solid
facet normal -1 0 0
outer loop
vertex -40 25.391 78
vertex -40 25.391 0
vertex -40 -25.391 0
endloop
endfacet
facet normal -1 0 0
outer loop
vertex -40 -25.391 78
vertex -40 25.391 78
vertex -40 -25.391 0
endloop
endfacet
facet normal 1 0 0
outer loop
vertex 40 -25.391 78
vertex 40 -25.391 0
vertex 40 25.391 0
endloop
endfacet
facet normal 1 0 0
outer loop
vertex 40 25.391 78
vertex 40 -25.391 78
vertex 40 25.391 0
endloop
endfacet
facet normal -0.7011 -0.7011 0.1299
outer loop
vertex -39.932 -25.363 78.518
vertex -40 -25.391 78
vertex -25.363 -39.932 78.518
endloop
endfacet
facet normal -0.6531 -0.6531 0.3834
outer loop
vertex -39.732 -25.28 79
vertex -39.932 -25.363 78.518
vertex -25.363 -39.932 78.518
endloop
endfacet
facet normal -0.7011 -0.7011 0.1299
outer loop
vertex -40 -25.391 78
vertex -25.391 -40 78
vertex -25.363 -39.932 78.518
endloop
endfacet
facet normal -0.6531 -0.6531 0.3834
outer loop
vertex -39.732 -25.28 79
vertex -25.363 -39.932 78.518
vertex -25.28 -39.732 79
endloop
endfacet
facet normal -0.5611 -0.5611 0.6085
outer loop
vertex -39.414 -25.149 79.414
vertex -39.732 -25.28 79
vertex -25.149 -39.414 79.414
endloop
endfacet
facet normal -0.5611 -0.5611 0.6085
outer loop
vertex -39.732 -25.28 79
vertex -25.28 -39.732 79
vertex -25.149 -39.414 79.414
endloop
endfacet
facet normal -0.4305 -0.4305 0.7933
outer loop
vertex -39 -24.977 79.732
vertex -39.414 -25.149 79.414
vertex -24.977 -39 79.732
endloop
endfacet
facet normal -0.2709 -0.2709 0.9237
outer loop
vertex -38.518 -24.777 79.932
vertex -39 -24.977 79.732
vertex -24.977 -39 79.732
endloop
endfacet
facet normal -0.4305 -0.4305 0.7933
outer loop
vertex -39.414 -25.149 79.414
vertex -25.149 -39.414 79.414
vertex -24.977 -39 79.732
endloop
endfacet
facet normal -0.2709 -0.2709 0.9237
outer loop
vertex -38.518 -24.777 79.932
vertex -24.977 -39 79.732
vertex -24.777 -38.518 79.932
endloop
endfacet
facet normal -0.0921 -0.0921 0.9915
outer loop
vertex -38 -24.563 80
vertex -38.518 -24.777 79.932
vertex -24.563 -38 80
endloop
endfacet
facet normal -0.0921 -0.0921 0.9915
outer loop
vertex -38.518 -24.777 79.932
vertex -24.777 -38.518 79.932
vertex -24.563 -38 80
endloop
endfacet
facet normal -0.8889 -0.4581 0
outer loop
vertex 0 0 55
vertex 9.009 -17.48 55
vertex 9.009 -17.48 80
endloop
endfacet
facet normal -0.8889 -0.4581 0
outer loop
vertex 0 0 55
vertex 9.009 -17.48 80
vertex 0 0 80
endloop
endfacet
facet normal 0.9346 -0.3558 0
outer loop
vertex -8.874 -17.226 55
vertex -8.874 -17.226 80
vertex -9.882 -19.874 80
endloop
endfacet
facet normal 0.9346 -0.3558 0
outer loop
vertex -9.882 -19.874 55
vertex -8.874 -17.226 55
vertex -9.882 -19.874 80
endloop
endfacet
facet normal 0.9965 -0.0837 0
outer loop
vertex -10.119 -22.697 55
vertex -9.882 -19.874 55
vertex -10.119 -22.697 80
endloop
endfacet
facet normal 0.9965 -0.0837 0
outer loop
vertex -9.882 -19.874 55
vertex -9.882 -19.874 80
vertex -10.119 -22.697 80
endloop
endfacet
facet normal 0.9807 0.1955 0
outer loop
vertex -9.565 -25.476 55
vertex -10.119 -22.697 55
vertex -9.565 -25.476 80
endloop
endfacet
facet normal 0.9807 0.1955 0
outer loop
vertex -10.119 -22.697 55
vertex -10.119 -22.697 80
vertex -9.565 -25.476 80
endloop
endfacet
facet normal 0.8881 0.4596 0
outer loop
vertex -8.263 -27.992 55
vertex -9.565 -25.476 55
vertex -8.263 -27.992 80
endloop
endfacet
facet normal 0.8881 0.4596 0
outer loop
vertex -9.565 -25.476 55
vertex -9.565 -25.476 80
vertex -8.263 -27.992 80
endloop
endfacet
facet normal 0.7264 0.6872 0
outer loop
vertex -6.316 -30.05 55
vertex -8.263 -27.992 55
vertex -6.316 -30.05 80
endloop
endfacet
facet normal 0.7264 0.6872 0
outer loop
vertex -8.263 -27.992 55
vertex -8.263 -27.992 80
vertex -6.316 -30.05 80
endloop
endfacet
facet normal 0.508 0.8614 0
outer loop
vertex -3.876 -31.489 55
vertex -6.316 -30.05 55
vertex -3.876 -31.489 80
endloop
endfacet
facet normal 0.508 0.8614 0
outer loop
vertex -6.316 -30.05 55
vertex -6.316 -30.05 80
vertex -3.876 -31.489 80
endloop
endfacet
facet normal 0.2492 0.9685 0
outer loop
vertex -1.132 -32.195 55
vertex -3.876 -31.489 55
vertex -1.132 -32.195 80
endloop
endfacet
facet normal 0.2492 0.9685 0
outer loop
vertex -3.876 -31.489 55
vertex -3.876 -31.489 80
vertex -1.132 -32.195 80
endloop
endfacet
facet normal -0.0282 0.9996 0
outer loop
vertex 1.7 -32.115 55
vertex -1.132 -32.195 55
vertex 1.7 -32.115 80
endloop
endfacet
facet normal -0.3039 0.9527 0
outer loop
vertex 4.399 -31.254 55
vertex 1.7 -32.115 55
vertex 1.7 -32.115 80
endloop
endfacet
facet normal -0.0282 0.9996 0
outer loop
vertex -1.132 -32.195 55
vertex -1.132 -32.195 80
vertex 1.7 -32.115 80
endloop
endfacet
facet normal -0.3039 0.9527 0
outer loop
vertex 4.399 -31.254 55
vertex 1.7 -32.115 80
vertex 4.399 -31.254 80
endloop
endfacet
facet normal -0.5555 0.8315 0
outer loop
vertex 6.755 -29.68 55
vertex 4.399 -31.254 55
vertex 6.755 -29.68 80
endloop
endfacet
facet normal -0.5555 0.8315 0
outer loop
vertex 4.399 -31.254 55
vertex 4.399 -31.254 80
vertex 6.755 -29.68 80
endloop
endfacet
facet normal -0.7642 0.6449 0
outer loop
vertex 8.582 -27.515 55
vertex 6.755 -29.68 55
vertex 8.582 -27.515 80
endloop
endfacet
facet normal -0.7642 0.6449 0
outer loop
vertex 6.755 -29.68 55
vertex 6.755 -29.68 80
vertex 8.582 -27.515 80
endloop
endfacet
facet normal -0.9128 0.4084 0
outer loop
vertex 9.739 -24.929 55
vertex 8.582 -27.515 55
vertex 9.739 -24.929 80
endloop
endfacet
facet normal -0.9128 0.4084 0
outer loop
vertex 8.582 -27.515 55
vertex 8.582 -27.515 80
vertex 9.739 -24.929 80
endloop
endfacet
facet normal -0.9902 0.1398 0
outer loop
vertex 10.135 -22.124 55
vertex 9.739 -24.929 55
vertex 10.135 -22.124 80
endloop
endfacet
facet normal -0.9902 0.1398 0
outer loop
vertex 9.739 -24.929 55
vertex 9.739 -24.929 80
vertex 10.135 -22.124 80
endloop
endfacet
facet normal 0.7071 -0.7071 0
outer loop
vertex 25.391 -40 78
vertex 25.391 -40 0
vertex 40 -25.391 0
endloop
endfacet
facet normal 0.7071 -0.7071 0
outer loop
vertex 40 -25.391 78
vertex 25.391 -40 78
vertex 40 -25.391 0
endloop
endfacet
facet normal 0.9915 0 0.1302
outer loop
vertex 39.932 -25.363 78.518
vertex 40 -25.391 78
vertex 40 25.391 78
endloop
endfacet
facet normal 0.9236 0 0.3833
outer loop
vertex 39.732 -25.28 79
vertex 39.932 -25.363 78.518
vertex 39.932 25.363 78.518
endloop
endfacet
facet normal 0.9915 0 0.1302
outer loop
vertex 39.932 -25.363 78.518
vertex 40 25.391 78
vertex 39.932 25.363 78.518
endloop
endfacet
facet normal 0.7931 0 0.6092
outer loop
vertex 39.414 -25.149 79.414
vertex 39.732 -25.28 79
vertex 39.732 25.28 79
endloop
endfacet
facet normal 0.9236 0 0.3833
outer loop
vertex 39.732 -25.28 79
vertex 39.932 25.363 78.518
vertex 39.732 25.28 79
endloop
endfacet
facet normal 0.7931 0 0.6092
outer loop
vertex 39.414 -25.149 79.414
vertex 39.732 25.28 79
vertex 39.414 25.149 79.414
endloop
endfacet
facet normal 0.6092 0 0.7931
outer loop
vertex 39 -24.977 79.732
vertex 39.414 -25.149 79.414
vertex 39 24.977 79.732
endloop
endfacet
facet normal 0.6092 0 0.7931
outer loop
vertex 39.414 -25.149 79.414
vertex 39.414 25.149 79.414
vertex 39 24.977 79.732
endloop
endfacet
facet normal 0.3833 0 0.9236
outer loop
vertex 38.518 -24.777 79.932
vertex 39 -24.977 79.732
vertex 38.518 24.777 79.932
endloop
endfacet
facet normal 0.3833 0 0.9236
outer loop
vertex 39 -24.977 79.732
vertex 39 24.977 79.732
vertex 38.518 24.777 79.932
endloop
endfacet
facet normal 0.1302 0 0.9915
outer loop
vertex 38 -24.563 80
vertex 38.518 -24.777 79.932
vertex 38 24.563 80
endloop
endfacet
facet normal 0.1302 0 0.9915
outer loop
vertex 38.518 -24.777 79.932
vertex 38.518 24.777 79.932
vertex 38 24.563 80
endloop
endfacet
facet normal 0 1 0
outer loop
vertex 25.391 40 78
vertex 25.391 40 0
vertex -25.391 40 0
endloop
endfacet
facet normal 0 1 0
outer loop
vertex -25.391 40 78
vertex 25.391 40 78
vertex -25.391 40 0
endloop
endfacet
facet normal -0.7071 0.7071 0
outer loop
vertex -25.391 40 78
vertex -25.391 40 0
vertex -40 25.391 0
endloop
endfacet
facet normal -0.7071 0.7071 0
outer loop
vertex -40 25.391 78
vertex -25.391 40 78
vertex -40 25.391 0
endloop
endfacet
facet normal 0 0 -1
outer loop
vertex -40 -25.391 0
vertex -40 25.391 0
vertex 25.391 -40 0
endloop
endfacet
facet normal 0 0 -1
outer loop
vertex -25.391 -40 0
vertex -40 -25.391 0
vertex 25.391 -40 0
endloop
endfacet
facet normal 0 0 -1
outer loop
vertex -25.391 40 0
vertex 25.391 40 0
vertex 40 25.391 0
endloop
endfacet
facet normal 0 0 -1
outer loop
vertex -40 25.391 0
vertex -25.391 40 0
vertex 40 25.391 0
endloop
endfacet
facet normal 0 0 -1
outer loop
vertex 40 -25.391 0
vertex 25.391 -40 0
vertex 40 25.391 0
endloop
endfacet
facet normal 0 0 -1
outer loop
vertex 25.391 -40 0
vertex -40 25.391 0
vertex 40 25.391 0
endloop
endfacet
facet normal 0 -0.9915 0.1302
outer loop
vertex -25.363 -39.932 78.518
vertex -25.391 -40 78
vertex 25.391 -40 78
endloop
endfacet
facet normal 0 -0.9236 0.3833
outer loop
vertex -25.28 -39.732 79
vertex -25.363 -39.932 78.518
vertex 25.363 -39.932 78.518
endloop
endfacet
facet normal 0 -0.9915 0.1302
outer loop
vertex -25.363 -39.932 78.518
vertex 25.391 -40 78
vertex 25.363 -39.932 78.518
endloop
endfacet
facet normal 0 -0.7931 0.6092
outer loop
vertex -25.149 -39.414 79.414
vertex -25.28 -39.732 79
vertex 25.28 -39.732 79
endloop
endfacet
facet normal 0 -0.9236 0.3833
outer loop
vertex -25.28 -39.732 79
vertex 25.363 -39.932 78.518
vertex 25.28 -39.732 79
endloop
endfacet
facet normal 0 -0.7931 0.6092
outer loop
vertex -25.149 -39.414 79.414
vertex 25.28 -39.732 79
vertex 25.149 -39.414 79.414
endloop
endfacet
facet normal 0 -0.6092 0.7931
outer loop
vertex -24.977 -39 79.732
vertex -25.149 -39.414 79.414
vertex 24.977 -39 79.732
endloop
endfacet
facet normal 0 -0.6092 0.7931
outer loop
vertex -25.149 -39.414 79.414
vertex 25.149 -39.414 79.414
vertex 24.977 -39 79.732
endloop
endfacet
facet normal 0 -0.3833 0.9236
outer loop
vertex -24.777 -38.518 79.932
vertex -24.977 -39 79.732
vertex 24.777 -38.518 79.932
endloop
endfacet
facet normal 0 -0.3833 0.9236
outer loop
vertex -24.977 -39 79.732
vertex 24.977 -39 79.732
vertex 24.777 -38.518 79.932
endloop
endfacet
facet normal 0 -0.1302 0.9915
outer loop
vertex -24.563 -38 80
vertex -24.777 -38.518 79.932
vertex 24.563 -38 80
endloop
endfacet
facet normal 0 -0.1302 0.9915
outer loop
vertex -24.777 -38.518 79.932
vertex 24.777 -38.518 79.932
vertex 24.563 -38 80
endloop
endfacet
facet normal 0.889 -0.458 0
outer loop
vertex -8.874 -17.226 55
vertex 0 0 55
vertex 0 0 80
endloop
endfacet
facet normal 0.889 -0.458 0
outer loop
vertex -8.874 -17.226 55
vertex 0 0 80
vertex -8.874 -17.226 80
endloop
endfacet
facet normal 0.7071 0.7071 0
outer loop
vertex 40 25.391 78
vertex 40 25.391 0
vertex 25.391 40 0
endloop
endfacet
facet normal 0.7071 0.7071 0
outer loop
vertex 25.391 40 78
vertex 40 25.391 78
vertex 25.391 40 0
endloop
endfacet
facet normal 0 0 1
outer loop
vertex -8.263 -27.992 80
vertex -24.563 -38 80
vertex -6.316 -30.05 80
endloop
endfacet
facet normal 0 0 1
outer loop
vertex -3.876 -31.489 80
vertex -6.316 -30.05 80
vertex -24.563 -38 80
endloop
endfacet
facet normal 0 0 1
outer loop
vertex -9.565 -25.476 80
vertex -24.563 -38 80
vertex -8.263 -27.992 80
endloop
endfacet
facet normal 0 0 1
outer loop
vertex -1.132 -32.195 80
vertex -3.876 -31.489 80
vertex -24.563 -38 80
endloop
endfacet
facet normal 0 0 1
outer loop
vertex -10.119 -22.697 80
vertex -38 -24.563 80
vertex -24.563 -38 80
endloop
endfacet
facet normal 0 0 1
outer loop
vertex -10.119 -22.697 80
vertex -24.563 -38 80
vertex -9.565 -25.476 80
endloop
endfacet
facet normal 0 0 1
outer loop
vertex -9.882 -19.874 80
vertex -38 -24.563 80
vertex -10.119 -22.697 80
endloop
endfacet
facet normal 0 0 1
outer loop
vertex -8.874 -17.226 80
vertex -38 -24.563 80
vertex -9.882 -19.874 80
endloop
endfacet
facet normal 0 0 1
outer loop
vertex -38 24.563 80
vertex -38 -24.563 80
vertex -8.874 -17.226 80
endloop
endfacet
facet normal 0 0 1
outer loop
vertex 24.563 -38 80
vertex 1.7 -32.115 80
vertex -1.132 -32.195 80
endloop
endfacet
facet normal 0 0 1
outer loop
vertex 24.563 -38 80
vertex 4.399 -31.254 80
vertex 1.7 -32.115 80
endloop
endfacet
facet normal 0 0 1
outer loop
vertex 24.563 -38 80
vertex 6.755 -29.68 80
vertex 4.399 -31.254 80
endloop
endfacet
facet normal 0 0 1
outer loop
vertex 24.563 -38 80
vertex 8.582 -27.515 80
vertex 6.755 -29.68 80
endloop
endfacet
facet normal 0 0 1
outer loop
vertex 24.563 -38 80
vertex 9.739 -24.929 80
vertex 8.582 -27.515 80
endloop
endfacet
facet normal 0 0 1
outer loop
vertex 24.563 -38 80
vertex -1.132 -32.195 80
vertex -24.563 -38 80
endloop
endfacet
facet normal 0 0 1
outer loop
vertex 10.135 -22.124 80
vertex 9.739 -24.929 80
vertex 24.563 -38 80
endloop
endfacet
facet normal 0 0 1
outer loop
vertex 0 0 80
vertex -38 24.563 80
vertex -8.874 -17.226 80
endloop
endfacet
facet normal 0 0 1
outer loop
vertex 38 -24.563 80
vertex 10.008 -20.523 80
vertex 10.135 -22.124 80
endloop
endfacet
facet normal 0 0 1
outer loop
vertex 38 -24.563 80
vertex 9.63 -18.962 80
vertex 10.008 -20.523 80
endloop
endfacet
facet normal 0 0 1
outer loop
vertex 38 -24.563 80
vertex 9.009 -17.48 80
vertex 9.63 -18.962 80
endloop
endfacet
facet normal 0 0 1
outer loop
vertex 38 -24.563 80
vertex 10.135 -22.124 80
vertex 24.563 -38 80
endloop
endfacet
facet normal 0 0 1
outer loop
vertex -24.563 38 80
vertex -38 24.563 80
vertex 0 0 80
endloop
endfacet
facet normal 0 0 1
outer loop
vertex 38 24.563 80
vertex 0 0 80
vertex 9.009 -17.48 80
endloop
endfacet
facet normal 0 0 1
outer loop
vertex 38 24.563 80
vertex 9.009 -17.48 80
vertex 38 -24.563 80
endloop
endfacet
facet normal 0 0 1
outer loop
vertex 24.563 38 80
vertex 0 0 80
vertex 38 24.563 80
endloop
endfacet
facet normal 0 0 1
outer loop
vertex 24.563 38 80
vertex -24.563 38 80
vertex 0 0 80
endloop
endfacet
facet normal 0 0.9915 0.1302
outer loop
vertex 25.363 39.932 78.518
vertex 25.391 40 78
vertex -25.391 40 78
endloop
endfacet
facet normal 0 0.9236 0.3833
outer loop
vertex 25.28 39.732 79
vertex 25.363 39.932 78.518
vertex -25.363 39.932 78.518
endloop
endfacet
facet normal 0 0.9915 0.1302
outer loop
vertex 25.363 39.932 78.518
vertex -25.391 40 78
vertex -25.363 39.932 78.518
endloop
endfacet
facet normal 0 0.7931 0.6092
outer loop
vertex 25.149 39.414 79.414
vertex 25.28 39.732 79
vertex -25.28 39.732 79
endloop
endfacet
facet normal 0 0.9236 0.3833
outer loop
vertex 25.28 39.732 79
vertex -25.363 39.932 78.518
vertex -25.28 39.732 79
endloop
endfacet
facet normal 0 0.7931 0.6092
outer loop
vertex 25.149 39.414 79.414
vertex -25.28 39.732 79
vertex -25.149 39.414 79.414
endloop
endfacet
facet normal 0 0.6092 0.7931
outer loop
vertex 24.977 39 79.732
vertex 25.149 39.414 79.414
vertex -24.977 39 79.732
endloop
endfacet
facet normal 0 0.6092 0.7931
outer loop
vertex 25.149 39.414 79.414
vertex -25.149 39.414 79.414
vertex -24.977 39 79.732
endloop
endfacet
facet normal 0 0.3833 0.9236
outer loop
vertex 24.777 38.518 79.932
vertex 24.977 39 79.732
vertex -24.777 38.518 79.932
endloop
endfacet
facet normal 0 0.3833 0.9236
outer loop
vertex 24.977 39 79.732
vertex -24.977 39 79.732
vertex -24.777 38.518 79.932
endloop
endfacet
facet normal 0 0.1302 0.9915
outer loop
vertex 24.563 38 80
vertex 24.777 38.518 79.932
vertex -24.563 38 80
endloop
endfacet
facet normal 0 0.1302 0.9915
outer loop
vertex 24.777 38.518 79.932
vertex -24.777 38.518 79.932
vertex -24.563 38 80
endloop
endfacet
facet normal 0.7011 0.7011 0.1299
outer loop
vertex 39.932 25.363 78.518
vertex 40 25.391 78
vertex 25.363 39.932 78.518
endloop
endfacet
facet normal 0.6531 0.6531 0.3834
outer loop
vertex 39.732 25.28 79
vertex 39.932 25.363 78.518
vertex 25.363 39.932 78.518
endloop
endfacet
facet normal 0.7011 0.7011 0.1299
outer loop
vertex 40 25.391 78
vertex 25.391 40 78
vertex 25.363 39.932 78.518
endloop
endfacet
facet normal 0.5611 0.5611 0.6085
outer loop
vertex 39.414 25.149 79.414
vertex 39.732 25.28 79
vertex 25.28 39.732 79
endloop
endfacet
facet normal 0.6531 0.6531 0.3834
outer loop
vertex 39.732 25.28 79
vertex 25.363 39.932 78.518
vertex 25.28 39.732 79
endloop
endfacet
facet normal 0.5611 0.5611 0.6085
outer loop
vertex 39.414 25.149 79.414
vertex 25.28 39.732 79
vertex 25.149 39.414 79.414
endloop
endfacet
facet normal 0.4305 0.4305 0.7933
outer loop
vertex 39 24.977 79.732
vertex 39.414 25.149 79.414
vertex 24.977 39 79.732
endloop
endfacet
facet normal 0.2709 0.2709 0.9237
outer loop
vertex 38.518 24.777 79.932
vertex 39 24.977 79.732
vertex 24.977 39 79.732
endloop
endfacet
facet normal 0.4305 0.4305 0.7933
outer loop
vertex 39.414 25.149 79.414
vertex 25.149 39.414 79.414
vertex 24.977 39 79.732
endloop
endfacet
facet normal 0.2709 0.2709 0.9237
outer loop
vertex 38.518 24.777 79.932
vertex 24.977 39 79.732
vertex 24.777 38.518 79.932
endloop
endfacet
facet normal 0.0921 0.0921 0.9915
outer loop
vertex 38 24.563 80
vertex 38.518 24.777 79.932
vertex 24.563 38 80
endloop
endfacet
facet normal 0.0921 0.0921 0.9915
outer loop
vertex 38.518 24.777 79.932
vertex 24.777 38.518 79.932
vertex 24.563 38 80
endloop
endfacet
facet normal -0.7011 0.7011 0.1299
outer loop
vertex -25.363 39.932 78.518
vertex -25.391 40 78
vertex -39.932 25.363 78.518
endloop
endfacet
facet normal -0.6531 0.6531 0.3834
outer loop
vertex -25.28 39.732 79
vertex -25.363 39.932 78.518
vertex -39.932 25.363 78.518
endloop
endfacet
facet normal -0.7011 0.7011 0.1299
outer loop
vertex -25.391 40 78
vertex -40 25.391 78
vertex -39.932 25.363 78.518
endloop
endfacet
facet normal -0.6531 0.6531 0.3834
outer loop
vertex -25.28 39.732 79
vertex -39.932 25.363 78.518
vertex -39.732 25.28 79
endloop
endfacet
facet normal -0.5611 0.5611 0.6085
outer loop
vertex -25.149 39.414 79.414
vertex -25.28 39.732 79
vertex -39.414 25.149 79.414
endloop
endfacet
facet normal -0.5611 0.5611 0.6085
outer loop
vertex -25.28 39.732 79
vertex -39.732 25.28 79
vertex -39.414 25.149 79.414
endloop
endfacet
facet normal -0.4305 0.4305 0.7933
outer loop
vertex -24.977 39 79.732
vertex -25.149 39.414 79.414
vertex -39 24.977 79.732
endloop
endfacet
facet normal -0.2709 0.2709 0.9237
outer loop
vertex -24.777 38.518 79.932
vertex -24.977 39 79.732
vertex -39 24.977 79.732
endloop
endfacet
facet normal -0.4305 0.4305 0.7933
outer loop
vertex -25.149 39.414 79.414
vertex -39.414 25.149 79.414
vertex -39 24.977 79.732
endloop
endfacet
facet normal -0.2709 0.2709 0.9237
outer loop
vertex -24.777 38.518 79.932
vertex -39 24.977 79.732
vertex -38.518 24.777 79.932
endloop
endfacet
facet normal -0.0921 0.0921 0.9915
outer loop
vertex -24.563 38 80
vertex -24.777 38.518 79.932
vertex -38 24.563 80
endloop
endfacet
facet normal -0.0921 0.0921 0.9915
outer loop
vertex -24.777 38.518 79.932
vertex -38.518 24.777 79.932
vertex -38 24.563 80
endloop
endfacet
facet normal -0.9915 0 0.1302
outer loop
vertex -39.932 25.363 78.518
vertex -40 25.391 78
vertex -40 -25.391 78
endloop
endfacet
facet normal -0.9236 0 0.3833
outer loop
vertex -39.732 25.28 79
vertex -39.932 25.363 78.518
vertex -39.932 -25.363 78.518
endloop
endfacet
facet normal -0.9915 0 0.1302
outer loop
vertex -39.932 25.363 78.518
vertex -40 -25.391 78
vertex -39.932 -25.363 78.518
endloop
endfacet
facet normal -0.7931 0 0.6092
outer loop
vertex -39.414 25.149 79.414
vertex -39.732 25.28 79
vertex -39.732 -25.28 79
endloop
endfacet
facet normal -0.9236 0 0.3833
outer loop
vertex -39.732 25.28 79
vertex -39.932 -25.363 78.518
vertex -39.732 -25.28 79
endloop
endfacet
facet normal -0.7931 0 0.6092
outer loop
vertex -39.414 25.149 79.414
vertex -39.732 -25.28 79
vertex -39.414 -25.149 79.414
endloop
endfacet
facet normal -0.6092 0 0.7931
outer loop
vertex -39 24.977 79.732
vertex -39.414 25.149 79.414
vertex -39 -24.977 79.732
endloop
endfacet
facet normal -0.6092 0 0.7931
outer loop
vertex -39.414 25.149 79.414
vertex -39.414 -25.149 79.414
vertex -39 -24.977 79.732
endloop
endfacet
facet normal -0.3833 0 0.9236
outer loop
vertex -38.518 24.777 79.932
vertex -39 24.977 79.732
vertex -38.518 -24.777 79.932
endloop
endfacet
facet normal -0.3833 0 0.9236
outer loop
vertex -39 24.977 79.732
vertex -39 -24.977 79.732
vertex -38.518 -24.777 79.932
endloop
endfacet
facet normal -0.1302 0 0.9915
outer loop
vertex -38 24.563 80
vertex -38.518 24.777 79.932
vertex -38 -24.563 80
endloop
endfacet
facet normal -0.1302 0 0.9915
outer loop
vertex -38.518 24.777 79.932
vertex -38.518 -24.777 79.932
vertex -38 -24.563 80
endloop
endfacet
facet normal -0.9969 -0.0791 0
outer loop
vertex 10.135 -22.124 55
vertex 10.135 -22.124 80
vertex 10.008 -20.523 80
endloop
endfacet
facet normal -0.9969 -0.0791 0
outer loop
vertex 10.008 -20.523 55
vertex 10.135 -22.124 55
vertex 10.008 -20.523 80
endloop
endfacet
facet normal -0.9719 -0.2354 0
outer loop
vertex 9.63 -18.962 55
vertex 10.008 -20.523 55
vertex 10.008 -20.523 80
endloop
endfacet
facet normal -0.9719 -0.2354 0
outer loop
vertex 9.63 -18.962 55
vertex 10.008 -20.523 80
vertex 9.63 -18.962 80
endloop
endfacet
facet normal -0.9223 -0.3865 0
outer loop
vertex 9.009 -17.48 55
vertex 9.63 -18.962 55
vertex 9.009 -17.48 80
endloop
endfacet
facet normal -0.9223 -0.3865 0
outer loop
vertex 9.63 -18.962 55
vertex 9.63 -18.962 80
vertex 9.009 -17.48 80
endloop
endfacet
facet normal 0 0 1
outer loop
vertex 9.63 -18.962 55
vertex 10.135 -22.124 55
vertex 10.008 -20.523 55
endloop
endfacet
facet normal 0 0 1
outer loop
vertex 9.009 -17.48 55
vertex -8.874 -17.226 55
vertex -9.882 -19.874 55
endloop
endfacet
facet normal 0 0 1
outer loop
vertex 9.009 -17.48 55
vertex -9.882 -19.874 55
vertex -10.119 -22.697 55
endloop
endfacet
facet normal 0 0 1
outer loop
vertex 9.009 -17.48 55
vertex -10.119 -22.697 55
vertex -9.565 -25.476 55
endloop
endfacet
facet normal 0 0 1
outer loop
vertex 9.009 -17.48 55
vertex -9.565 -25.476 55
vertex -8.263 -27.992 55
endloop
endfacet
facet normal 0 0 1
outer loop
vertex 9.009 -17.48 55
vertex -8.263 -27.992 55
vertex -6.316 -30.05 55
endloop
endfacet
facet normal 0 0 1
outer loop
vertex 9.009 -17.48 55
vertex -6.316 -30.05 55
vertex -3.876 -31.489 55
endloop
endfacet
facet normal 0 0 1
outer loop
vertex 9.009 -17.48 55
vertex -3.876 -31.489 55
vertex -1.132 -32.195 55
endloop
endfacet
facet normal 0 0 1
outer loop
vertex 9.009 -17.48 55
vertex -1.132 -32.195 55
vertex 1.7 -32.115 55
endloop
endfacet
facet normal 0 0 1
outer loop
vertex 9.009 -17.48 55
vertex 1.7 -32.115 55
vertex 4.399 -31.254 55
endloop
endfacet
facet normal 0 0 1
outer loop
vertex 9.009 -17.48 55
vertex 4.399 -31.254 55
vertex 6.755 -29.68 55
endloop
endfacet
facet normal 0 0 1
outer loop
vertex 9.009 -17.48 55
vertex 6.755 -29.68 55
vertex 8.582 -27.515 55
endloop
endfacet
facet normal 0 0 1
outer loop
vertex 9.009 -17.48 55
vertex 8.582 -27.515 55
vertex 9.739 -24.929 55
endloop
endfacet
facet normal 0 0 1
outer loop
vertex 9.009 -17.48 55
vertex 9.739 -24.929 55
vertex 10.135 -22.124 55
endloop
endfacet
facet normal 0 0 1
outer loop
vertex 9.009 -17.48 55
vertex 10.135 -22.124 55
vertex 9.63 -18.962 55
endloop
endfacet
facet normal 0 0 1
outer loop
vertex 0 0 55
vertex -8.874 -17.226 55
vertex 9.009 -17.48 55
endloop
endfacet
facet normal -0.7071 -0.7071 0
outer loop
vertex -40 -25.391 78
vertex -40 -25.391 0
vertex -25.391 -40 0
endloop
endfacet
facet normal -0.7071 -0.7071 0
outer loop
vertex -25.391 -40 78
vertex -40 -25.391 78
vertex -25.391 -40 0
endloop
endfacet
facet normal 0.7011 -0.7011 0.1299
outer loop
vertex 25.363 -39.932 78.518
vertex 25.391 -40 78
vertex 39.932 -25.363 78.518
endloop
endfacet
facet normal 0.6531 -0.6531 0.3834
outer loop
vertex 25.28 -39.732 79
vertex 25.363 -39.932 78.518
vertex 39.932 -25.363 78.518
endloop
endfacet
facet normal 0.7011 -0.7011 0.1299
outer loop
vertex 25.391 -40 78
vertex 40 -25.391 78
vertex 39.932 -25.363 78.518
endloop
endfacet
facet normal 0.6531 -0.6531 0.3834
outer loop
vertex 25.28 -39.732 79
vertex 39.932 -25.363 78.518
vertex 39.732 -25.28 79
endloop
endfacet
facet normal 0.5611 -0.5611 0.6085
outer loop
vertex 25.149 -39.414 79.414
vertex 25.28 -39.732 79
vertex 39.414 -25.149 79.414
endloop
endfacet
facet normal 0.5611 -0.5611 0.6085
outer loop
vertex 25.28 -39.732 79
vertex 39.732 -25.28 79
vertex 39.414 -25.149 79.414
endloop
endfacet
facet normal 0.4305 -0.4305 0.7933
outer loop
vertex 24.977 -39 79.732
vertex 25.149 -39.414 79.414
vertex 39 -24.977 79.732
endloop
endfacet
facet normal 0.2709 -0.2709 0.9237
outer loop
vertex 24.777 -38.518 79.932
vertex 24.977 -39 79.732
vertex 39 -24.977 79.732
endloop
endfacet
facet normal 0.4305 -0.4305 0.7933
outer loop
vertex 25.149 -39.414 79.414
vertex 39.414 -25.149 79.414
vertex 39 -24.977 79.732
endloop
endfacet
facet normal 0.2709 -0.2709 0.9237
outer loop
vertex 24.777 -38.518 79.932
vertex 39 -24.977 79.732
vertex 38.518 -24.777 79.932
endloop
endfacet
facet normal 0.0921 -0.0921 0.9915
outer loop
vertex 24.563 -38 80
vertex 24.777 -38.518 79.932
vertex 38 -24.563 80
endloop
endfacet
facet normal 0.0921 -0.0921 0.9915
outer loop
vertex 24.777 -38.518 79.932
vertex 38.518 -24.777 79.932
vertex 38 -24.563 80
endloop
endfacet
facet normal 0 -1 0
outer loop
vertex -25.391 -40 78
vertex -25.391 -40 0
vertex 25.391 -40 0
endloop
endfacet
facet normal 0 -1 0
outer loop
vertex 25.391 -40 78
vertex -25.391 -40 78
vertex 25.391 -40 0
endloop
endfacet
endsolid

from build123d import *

# Parameters (mm, degrees)
F1_DEPTH = 80
F2_R     = 2
F4_DEPTH = 25


with BuildPart() as f1:
    # F0 (on Top) → F1 (new body)
    with BuildSketch(Plane.XY):
        Polygon((25.391311, 40), (0, 40), (-25.391311, 40), (-40, 25.391311), (-40, 0), (-40, -25.391311), (-25.391311, -40), (0, -40), (25.391311, -40), (40, -25.391311), (40, 0), (40, 25.391311), align=None)
    extrude(amount=F1_DEPTH)

    # F2
    f2_edges = [f1.edges().sort_by_distance(p)[0] for p in [
        (32.695656, 32.695656, 80),
        (0, 40, 80),
        (-32.695656, 32.695656, 80),
        (-40, 0, 80),
        (-32.695656, -32.695656, 80),
        (0, -40, 80),
        (32.695656, -32.695656, 80),
        (40, 0, 80),
    ]]
    fillet(f2_edges, radius=F2_R)

    # F3 (on face) → F4 (cut)
    with BuildSketch(Plane.XY.offset(80)):
        with BuildLine():
            ThreePointArc((-8.873674, -17.226376), (0.143915, -11.989261), (9.009154, -17.480326))
            Line((9.009154, -17.480326), (0, 0))
            Line((0, 0), (-8.873674, -17.226376))
        make_face()
        with BuildLine():
            ThreePointArc((-8.873674, -17.226376), (-2.528532, -31.938364), (10.135299, -22.123538))
            ThreePointArc((10.135299, -22.123538), (9.84974, -19.734625), (9.009154, -17.480326))
            ThreePointArc((9.009154, -17.480326), (0.143915, -11.989261), (-8.873674, -17.226376))
        make_face()
    extrude(amount=-F4_DEPTH, mode=Mode.SUBTRACT)


solid = f1.part
